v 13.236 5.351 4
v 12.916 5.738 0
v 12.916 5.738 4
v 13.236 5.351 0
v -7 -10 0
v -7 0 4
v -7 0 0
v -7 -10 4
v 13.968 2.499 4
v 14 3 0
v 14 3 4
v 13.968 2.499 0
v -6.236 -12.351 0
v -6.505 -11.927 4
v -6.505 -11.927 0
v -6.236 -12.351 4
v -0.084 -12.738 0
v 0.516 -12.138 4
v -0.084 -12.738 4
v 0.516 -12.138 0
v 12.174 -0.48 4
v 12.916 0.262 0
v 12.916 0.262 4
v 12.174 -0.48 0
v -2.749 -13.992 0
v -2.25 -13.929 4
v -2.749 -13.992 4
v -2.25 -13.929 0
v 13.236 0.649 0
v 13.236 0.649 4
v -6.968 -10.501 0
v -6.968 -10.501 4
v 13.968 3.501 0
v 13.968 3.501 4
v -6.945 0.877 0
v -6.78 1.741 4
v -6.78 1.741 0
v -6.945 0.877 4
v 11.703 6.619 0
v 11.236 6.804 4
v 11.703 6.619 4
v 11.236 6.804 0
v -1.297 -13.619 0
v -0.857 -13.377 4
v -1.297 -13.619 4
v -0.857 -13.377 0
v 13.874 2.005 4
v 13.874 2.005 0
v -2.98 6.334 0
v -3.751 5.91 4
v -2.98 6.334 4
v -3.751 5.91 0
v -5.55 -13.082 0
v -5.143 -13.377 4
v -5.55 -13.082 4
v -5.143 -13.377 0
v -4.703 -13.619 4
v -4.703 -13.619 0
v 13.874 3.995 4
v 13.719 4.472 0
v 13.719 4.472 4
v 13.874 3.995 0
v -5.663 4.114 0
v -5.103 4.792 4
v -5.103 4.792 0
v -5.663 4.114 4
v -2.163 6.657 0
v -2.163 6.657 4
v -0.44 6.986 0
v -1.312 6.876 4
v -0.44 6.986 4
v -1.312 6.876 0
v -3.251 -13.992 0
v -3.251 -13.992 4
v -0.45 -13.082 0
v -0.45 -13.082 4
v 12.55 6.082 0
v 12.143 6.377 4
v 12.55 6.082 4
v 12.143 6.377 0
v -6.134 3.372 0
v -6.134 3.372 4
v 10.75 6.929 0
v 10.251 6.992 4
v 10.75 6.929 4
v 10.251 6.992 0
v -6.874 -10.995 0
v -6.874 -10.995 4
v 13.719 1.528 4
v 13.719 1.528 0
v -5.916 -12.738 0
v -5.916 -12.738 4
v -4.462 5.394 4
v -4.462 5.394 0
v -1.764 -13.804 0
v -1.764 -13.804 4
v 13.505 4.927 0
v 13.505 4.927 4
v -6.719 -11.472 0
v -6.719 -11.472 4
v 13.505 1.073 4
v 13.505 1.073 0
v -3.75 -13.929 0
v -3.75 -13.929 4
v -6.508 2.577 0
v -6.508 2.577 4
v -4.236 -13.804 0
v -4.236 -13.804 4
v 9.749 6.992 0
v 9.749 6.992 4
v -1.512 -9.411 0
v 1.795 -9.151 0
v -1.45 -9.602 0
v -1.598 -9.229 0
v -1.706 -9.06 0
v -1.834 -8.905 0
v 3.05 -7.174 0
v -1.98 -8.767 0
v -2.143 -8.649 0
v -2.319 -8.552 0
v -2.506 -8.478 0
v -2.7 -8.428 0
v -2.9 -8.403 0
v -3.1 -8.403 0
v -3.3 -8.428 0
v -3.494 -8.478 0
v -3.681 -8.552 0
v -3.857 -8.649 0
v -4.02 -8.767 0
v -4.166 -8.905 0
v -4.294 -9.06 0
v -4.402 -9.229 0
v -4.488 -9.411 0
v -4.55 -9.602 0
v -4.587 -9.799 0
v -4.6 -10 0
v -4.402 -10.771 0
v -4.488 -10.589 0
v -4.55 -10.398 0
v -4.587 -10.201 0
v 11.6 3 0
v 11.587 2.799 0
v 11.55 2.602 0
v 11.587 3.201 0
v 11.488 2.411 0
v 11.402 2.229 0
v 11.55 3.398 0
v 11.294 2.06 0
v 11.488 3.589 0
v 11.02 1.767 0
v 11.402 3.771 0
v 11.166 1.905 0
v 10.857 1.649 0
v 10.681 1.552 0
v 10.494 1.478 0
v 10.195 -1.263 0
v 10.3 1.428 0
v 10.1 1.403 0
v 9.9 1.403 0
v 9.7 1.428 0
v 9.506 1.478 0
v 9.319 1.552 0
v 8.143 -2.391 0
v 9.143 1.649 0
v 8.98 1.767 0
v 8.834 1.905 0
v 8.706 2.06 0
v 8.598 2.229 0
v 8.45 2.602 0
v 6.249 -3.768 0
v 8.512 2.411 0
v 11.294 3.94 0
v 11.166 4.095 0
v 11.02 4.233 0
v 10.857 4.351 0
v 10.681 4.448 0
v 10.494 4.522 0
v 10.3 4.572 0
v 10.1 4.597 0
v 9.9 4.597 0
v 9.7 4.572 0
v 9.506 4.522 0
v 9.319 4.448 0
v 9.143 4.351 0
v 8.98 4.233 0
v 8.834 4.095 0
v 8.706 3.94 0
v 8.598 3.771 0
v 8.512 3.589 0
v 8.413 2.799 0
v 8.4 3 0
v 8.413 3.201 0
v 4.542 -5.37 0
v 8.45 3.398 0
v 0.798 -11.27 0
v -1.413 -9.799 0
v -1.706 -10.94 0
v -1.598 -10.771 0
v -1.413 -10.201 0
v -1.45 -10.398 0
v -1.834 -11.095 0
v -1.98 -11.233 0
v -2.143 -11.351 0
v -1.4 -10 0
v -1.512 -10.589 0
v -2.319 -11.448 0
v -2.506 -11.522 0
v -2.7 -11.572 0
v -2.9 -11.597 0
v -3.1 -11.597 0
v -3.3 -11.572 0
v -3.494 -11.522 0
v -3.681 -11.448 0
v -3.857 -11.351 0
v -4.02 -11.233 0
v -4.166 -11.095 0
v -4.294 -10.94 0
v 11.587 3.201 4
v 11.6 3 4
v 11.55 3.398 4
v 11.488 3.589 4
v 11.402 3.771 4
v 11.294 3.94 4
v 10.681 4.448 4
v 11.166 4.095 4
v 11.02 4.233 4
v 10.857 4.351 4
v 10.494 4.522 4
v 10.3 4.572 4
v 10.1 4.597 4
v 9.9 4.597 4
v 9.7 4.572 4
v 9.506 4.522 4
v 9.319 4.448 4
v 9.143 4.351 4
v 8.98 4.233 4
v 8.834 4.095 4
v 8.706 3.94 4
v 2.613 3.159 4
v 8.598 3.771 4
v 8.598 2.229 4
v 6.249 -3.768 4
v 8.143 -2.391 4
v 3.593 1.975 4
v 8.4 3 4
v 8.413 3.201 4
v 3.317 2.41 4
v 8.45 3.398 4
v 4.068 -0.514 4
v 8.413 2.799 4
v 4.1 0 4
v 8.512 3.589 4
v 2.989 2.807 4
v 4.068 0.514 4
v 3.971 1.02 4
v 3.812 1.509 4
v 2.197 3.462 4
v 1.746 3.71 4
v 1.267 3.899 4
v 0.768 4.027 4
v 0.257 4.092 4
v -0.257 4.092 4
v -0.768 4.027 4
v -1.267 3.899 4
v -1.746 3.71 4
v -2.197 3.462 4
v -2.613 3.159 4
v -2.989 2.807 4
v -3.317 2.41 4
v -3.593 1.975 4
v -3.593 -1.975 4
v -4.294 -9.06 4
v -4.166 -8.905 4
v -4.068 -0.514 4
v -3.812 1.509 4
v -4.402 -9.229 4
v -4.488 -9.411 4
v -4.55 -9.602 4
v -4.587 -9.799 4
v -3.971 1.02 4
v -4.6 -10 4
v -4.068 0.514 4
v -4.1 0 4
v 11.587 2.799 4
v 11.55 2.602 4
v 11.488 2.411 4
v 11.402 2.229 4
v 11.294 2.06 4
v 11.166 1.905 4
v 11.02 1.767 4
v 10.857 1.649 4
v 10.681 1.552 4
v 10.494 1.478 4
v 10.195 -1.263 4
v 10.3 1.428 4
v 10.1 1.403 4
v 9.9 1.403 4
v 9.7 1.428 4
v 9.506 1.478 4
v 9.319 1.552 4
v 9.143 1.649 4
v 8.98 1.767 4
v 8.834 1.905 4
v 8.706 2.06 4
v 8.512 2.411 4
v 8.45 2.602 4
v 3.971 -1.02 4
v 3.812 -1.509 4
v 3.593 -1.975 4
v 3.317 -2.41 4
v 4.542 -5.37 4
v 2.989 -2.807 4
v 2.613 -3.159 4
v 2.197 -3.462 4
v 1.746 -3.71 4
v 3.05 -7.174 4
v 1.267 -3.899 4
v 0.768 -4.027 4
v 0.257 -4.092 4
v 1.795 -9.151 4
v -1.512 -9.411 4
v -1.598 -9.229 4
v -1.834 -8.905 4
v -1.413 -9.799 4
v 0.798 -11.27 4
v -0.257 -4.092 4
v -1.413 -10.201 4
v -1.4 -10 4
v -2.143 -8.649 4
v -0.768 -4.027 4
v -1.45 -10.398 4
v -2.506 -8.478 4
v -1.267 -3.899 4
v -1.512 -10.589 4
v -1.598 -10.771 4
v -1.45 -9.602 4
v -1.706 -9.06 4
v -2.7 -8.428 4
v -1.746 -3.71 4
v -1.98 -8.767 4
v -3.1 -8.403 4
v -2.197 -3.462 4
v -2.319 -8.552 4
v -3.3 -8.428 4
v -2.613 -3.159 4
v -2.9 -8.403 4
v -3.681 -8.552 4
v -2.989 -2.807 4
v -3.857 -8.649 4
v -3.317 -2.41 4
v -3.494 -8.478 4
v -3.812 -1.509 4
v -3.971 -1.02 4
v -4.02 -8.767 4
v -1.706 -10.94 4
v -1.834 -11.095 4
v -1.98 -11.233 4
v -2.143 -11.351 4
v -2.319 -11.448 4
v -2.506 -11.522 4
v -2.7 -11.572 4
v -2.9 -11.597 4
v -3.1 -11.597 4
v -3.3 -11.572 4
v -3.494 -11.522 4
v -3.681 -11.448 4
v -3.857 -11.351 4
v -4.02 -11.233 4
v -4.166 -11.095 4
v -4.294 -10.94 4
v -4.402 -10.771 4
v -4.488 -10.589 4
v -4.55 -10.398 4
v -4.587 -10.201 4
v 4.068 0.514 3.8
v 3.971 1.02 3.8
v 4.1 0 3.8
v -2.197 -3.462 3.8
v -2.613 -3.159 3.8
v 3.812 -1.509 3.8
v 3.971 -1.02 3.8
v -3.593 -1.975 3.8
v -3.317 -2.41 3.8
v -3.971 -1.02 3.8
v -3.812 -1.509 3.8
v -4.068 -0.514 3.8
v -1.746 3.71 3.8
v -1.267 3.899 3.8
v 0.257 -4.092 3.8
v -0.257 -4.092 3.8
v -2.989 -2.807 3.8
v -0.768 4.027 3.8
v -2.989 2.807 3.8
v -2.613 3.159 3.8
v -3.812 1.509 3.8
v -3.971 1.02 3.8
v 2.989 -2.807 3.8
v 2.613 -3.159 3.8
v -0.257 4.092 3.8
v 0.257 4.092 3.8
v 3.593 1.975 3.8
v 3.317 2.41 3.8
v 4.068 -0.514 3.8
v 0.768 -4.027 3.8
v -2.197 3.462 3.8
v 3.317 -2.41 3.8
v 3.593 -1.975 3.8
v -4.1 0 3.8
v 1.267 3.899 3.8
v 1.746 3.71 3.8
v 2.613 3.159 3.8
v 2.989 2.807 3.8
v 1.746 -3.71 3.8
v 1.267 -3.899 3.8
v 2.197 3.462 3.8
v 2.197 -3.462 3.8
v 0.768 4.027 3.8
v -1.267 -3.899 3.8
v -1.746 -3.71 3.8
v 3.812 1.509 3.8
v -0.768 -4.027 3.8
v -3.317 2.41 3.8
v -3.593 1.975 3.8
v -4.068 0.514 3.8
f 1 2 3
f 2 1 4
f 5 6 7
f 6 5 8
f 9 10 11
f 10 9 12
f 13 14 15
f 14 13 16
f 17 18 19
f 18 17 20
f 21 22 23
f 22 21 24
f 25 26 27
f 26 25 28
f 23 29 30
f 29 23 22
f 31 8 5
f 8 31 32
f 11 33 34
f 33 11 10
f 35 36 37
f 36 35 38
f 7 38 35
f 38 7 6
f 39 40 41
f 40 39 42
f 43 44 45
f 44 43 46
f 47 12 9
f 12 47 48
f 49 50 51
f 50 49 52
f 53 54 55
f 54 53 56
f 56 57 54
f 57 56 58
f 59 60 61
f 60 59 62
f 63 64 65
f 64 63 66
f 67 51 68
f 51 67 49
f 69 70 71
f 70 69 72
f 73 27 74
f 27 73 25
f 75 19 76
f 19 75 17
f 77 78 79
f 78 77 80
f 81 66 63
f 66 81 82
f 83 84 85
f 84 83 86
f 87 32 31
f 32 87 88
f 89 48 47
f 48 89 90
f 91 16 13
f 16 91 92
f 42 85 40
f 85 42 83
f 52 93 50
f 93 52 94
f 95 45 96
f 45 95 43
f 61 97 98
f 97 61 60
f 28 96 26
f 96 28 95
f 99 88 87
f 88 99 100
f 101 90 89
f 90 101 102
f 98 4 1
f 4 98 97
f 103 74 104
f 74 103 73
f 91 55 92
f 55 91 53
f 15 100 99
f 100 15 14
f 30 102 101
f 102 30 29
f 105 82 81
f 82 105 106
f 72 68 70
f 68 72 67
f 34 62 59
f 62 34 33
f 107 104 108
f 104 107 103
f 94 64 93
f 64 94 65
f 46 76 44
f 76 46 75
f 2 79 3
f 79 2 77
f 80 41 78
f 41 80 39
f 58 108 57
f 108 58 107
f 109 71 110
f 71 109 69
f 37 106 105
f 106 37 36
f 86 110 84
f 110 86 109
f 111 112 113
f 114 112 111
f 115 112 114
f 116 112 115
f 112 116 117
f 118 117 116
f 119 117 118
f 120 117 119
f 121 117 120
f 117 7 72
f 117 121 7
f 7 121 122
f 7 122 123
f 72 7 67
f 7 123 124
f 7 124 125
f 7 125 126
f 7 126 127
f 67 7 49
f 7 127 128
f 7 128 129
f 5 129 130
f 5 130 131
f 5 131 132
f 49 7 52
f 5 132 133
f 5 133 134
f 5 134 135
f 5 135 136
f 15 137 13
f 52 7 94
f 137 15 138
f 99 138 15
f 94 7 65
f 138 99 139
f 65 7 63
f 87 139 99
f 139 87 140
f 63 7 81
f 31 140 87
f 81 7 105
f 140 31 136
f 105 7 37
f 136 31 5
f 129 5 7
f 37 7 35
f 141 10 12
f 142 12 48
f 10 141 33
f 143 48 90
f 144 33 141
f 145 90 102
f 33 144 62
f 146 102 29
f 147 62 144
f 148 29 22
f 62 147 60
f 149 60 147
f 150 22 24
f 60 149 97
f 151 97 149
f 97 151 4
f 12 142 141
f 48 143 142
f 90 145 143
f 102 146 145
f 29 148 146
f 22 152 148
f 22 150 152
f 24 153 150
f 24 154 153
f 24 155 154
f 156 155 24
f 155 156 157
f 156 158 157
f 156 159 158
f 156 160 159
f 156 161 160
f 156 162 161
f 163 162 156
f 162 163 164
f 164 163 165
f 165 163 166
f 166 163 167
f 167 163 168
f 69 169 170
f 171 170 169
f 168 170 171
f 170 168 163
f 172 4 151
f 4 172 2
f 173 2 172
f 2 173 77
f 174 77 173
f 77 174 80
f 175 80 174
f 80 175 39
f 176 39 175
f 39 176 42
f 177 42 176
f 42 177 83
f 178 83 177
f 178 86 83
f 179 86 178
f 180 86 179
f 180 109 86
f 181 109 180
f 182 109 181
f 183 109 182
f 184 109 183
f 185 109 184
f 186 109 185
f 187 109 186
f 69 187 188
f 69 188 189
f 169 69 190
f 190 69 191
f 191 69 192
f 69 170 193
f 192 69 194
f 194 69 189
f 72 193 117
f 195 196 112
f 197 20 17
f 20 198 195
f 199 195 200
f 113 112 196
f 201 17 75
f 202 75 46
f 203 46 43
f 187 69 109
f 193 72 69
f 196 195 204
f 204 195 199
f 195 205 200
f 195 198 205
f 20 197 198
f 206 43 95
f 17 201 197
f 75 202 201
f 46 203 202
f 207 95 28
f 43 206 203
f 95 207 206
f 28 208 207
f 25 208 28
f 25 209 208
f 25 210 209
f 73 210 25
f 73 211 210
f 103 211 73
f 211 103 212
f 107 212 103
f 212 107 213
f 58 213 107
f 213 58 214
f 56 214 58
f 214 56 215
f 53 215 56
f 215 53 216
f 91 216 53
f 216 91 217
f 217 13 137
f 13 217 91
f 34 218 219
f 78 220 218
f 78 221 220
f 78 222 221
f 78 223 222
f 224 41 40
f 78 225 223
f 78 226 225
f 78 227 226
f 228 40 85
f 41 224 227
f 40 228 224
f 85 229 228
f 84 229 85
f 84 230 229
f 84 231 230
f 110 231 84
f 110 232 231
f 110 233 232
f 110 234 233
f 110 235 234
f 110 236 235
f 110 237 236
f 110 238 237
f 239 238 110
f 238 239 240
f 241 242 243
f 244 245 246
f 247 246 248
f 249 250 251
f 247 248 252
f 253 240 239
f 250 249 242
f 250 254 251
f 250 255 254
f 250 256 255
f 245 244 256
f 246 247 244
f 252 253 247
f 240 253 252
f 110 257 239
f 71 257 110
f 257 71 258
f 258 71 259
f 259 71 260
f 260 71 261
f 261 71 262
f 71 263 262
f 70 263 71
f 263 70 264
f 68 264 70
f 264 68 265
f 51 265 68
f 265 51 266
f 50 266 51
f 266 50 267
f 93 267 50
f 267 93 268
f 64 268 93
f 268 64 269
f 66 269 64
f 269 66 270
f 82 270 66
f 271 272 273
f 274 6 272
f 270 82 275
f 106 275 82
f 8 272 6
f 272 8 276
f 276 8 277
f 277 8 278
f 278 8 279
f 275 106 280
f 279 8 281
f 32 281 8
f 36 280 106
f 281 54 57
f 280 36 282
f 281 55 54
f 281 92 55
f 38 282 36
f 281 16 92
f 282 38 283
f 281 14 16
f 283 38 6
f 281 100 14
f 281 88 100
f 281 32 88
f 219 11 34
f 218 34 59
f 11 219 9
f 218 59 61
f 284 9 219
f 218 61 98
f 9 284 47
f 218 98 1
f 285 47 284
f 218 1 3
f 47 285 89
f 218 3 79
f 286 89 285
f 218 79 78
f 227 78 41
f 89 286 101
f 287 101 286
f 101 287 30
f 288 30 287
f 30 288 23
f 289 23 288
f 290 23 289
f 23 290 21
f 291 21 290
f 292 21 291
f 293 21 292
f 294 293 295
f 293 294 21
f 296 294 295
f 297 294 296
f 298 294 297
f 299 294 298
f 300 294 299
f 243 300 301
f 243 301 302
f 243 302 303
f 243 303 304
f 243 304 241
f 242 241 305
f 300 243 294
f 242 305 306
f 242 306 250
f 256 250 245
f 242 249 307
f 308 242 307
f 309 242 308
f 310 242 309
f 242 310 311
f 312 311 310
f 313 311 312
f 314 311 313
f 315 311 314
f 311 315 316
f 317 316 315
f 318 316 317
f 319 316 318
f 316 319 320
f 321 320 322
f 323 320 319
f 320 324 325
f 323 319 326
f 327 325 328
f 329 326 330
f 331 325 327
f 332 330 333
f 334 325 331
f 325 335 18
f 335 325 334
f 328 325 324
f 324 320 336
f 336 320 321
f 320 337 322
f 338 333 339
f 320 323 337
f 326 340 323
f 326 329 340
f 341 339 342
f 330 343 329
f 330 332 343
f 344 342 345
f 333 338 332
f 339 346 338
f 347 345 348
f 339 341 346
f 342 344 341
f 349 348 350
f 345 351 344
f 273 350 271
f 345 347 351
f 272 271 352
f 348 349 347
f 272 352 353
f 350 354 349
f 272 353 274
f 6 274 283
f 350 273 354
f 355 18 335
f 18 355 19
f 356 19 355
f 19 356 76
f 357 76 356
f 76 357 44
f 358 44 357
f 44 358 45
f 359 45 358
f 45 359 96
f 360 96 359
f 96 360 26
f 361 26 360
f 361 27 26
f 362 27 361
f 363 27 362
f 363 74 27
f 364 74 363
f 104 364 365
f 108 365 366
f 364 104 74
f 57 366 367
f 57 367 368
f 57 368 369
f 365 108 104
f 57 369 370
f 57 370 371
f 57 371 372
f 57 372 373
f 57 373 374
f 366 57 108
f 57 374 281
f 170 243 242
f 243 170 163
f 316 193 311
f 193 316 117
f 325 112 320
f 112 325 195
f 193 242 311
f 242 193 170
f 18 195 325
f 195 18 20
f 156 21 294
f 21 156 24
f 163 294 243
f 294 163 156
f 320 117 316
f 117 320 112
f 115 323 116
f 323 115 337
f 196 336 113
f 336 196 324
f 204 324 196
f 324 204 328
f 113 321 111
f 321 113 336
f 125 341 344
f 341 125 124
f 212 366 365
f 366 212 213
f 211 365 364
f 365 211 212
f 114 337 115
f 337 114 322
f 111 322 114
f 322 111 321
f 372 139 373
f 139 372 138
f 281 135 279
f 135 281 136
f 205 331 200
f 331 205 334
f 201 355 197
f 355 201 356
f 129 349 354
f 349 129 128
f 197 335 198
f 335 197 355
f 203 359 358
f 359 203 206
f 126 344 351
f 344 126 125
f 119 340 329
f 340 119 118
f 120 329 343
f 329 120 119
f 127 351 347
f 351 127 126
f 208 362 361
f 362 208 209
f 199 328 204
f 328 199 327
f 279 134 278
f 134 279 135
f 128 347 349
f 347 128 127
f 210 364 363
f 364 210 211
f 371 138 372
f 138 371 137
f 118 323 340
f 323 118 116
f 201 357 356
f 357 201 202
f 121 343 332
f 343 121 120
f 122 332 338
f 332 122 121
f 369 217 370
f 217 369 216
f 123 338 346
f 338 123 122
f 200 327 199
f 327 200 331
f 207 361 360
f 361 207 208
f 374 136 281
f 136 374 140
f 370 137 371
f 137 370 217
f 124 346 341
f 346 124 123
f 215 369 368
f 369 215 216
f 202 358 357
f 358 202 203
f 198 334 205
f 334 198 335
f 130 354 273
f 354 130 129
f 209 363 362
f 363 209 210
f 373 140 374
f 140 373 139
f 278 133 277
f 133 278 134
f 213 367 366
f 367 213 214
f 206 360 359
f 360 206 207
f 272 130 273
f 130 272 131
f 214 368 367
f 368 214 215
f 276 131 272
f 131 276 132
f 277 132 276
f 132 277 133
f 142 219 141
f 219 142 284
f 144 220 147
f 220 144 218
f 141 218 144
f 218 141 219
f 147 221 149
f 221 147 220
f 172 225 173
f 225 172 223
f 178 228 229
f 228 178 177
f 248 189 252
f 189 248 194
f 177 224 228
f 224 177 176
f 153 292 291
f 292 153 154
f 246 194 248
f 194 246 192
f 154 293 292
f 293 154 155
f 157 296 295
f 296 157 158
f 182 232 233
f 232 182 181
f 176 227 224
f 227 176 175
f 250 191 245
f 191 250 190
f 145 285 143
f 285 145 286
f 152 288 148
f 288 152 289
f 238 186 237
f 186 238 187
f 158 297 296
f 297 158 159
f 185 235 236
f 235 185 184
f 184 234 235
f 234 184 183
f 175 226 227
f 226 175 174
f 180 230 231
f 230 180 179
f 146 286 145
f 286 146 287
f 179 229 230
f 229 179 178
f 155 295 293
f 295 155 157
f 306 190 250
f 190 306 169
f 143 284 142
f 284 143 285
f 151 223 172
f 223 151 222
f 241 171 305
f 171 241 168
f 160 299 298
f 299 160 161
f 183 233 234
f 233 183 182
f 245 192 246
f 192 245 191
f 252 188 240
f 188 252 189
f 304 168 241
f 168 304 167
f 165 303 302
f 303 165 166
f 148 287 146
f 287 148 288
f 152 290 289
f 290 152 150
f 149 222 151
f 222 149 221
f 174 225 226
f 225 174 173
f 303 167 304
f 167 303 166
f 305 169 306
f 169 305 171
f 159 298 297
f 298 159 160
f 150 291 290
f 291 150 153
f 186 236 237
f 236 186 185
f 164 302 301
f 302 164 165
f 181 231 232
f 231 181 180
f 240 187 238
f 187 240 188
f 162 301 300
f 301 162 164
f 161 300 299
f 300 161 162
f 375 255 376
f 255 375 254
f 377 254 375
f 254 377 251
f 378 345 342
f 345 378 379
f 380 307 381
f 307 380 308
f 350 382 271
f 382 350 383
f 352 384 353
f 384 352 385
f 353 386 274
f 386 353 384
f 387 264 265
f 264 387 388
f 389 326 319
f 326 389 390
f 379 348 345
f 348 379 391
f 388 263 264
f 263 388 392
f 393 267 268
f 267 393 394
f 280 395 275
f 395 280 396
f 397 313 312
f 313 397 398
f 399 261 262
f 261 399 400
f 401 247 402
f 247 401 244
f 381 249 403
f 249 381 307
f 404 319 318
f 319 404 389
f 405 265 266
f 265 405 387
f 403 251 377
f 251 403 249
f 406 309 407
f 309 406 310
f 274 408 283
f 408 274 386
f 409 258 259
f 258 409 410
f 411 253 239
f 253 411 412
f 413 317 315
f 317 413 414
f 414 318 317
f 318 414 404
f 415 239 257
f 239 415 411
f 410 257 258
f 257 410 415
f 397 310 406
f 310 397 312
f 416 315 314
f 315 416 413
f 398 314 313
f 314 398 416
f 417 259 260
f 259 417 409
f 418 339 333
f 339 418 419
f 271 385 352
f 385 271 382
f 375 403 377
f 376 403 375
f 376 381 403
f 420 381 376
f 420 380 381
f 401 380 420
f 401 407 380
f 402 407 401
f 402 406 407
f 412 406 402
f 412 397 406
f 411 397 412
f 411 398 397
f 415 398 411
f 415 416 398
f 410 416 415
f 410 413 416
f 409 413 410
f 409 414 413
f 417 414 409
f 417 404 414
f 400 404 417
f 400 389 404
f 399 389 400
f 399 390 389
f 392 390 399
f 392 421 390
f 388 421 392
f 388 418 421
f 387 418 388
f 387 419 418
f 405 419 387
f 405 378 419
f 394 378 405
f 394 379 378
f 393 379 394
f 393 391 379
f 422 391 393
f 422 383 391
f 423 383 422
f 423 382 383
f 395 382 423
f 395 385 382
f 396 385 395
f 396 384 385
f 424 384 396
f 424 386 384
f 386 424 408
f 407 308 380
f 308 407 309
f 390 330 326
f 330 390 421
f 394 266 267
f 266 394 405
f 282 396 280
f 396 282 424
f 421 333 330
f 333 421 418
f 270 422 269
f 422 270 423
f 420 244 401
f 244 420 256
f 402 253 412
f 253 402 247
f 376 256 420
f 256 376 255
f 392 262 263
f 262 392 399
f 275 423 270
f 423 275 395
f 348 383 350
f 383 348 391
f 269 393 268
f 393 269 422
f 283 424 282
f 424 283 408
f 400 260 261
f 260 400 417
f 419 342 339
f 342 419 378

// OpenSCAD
/*
 * Tatara A8 v1.10 Customizable Rods Blocker 
 * https://www.thingiverse.com/thing:2746024
 * 
 * by TataraTeam - https://www.thingiverse.com/TataraTeam/about
 * created 2018-01-05
 * version v0.02
 *
 * Changelog
 * --------------
 * v0.02:
 *      - Add extra hole 
 *
 * v0.01:
 *      - First version
 * --------------
 *
 * This work is licensed under the Creative Commons - Attribution - NonCommercial - ShareAlike license.
 * https://creativecommons.org/licenses/by-nc-sa/3.0/
 */

//preview[view:north, tilt:top]

// Height of whole part
h=4; //[4:0.04:8]
// Extra Depth for rod hole
depth=0.2; //[-1:0.04:2]
// extra hole diameter (0 no hole) for set screw
eh_diam=0;//[0:0.05:7]

   
if (eh_diam != 0) {
    difference() {
        flange_extra_space_hole(h,depth);
        cylinder(h*3, d = eh_diam, center = true, $fn=50);
        }
    }    
else {
    flange_extra_space_hole(h,depth);
    }    

echo("done");


// modules
module flange_extra_space_hole(h,depth){
    if (depth > 0) {
        difference() {  
            basicshape(h);
            translate([0,0,h-depth]) 
                cylinder(h, d = 8.2, center = false, $fn=50);
        }
    }
    if (depth <= 0) {
        union (){
            basicshape(h);
            translate([0,0,h]) 
                cylinder(-depth, d = 8.2, center = false, $fn=50);
            }
    }    
}  
    
    
module basicshape(h){
    difference() {  
        hull(){ // this is the main shape
        // make first clinder 
         cylinder(h, d = 14, center = false, $fn=50);
        // second cylinder and translate
        translate([-3,-10,0]) 
            cylinder(h, d = 8, center = false, $fn=50);
        //third cilinder and translate
        translate([10,3,0]) 
            cylinder(h, d = 8, center = false, $fn=50);
        }
        // round inner border
        translate([18.13333,-18.13333,0]) 
            cylinder(h*3, r = 18.64435, center=true, $fn=50);
        // make first hole and translate
        translate([-3,-10,0]) 
            cylinder(h*3, d = 3.2, center = true, $fn=50);
        // make second hole and translate
        translate([10,3,0]) 
            cylinder(h*3, d = 3.2, center = true, $fn=50);
        // the wole depth
        }
    }
